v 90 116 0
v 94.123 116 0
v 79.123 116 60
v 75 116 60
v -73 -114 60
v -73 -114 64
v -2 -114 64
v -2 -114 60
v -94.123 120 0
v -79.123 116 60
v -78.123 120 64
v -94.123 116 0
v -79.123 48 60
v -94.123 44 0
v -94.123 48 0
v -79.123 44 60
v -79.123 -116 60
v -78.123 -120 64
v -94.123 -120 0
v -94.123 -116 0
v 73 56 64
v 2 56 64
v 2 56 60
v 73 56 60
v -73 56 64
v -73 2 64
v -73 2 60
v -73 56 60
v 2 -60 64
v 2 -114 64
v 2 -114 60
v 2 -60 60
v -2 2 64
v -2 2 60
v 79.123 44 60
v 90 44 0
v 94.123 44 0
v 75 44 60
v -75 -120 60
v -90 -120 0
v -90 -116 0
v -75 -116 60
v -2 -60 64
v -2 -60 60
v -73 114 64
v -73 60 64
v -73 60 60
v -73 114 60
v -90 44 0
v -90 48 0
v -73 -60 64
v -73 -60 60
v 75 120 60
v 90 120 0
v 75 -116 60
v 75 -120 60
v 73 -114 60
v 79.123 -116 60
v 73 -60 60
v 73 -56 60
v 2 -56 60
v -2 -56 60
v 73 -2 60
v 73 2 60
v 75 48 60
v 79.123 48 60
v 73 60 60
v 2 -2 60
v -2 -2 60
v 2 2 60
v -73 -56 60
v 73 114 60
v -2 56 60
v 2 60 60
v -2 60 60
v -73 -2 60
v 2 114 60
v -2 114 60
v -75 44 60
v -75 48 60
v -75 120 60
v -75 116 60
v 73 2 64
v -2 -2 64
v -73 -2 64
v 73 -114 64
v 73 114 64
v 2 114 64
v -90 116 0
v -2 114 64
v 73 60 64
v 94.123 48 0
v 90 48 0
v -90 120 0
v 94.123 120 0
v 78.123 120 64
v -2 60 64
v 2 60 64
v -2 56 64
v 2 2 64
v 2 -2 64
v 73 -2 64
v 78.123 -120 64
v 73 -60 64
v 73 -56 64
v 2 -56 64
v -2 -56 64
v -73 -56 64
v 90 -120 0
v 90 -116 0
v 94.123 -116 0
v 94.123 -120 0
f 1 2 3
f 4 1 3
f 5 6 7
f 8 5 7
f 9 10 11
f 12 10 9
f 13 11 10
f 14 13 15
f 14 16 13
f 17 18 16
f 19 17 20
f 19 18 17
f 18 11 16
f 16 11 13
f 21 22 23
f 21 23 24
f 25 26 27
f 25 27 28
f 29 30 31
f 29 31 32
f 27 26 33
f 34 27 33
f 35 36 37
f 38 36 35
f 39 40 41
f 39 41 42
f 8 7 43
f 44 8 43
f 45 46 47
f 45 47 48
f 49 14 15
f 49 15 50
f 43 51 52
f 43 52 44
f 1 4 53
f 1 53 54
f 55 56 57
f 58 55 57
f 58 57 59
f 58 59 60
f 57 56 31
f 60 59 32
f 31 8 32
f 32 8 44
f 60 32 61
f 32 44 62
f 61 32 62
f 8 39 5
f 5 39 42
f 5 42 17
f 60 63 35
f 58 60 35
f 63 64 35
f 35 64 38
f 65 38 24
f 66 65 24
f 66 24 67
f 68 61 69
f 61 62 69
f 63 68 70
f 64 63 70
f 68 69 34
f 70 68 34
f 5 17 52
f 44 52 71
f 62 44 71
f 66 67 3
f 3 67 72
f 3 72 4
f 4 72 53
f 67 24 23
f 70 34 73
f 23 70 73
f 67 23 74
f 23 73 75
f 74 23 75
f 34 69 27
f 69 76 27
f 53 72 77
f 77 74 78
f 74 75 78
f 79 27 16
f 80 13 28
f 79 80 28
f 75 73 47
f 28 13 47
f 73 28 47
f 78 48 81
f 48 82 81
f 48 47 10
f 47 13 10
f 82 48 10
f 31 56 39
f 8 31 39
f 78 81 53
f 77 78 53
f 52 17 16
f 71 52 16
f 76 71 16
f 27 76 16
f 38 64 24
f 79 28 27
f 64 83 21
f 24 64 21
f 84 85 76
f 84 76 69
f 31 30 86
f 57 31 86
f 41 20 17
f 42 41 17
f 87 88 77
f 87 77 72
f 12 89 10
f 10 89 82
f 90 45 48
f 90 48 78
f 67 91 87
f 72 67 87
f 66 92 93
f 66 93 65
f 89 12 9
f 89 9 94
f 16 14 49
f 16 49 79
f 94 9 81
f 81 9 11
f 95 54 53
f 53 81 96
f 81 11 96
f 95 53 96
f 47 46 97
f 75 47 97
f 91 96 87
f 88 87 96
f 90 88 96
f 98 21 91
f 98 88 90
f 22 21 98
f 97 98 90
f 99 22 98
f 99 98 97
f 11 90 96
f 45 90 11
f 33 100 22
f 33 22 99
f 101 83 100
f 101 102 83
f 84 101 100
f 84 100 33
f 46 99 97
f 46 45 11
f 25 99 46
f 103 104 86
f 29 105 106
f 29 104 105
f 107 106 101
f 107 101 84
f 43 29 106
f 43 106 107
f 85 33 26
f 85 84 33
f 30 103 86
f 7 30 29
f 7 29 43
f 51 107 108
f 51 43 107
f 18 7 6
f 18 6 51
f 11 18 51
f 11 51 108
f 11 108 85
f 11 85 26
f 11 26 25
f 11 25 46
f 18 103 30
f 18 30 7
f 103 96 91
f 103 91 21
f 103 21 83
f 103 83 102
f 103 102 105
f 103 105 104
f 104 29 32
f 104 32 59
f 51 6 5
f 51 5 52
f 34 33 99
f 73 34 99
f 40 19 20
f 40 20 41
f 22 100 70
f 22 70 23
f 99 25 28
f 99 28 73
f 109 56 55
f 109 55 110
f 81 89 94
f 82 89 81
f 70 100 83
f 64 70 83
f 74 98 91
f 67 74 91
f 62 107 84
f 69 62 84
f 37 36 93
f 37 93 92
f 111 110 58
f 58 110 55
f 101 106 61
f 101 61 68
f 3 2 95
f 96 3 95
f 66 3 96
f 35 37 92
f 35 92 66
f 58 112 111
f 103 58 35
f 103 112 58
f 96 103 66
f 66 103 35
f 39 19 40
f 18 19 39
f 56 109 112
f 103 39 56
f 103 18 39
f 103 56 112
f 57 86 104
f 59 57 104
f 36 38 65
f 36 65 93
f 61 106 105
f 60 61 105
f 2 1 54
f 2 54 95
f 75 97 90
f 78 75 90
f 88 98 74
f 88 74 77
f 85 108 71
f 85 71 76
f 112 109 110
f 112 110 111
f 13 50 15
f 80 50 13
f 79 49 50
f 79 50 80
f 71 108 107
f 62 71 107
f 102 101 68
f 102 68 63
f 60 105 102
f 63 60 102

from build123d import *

# Parameters (mm, degrees)
F1_DEPTH = 120
F2_W     = 160
F2_H     = 60
F2_W_2   = 68
F3_DEPTH = 100
F4_W     = 71
F4_H     = 54
F5_DEPTH = 80.360247


with BuildPart() as f1:
    # F0 (on Front) → F1 (new body, symmetric)
    with BuildSketch(Plane.XZ):
        Polygon((-94.123106, 0), (-90, 0), (-75, 60), (75, 60), (90, 0), (94.123106, 0), (78.123106, 64), (-78.123106, 64), align=None)
    extrude(amount=F1_DEPTH, both=True)

    # F2 (on Right) → F3 (cut, symmetric)
    with BuildSketch(Plane.YZ):
        with Locations((-36, 30)):
            Rectangle(F2_W, F2_H)
        with Locations((82, 30)):
            Rectangle(F2_W_2, F2_H)
    extrude(amount=F3_DEPTH, both=True, mode=Mode.SUBTRACT)

    # F4 (on face) → F5 (cut)
    with BuildSketch(Plane.XY.offset(64)):
        with Locations((-37.5, 87)):
            Rectangle(F4_W, F4_H)
        with Locations((37.5, 87)):
            Rectangle(F4_W, F4_H)
        with Locations((-37.5, 29)):
            Rectangle(F4_W, F4_H)
        with Locations((37.5, 29)):
            Rectangle(F4_W, F4_H)
        with Locations((-37.5, -29)):
            Rectangle(F4_W, F4_H)
        with Locations((37.5, -29)):
            Rectangle(F4_W, F4_H)
        with Locations((-37.5, -87)):
            Rectangle(F4_W, F4_H)
        with Locations((37.5, -87)):
            Rectangle(F4_W, F4_H)
    extrude(amount=-F5_DEPTH, mode=Mode.SUBTRACT)


solid = f1.part
